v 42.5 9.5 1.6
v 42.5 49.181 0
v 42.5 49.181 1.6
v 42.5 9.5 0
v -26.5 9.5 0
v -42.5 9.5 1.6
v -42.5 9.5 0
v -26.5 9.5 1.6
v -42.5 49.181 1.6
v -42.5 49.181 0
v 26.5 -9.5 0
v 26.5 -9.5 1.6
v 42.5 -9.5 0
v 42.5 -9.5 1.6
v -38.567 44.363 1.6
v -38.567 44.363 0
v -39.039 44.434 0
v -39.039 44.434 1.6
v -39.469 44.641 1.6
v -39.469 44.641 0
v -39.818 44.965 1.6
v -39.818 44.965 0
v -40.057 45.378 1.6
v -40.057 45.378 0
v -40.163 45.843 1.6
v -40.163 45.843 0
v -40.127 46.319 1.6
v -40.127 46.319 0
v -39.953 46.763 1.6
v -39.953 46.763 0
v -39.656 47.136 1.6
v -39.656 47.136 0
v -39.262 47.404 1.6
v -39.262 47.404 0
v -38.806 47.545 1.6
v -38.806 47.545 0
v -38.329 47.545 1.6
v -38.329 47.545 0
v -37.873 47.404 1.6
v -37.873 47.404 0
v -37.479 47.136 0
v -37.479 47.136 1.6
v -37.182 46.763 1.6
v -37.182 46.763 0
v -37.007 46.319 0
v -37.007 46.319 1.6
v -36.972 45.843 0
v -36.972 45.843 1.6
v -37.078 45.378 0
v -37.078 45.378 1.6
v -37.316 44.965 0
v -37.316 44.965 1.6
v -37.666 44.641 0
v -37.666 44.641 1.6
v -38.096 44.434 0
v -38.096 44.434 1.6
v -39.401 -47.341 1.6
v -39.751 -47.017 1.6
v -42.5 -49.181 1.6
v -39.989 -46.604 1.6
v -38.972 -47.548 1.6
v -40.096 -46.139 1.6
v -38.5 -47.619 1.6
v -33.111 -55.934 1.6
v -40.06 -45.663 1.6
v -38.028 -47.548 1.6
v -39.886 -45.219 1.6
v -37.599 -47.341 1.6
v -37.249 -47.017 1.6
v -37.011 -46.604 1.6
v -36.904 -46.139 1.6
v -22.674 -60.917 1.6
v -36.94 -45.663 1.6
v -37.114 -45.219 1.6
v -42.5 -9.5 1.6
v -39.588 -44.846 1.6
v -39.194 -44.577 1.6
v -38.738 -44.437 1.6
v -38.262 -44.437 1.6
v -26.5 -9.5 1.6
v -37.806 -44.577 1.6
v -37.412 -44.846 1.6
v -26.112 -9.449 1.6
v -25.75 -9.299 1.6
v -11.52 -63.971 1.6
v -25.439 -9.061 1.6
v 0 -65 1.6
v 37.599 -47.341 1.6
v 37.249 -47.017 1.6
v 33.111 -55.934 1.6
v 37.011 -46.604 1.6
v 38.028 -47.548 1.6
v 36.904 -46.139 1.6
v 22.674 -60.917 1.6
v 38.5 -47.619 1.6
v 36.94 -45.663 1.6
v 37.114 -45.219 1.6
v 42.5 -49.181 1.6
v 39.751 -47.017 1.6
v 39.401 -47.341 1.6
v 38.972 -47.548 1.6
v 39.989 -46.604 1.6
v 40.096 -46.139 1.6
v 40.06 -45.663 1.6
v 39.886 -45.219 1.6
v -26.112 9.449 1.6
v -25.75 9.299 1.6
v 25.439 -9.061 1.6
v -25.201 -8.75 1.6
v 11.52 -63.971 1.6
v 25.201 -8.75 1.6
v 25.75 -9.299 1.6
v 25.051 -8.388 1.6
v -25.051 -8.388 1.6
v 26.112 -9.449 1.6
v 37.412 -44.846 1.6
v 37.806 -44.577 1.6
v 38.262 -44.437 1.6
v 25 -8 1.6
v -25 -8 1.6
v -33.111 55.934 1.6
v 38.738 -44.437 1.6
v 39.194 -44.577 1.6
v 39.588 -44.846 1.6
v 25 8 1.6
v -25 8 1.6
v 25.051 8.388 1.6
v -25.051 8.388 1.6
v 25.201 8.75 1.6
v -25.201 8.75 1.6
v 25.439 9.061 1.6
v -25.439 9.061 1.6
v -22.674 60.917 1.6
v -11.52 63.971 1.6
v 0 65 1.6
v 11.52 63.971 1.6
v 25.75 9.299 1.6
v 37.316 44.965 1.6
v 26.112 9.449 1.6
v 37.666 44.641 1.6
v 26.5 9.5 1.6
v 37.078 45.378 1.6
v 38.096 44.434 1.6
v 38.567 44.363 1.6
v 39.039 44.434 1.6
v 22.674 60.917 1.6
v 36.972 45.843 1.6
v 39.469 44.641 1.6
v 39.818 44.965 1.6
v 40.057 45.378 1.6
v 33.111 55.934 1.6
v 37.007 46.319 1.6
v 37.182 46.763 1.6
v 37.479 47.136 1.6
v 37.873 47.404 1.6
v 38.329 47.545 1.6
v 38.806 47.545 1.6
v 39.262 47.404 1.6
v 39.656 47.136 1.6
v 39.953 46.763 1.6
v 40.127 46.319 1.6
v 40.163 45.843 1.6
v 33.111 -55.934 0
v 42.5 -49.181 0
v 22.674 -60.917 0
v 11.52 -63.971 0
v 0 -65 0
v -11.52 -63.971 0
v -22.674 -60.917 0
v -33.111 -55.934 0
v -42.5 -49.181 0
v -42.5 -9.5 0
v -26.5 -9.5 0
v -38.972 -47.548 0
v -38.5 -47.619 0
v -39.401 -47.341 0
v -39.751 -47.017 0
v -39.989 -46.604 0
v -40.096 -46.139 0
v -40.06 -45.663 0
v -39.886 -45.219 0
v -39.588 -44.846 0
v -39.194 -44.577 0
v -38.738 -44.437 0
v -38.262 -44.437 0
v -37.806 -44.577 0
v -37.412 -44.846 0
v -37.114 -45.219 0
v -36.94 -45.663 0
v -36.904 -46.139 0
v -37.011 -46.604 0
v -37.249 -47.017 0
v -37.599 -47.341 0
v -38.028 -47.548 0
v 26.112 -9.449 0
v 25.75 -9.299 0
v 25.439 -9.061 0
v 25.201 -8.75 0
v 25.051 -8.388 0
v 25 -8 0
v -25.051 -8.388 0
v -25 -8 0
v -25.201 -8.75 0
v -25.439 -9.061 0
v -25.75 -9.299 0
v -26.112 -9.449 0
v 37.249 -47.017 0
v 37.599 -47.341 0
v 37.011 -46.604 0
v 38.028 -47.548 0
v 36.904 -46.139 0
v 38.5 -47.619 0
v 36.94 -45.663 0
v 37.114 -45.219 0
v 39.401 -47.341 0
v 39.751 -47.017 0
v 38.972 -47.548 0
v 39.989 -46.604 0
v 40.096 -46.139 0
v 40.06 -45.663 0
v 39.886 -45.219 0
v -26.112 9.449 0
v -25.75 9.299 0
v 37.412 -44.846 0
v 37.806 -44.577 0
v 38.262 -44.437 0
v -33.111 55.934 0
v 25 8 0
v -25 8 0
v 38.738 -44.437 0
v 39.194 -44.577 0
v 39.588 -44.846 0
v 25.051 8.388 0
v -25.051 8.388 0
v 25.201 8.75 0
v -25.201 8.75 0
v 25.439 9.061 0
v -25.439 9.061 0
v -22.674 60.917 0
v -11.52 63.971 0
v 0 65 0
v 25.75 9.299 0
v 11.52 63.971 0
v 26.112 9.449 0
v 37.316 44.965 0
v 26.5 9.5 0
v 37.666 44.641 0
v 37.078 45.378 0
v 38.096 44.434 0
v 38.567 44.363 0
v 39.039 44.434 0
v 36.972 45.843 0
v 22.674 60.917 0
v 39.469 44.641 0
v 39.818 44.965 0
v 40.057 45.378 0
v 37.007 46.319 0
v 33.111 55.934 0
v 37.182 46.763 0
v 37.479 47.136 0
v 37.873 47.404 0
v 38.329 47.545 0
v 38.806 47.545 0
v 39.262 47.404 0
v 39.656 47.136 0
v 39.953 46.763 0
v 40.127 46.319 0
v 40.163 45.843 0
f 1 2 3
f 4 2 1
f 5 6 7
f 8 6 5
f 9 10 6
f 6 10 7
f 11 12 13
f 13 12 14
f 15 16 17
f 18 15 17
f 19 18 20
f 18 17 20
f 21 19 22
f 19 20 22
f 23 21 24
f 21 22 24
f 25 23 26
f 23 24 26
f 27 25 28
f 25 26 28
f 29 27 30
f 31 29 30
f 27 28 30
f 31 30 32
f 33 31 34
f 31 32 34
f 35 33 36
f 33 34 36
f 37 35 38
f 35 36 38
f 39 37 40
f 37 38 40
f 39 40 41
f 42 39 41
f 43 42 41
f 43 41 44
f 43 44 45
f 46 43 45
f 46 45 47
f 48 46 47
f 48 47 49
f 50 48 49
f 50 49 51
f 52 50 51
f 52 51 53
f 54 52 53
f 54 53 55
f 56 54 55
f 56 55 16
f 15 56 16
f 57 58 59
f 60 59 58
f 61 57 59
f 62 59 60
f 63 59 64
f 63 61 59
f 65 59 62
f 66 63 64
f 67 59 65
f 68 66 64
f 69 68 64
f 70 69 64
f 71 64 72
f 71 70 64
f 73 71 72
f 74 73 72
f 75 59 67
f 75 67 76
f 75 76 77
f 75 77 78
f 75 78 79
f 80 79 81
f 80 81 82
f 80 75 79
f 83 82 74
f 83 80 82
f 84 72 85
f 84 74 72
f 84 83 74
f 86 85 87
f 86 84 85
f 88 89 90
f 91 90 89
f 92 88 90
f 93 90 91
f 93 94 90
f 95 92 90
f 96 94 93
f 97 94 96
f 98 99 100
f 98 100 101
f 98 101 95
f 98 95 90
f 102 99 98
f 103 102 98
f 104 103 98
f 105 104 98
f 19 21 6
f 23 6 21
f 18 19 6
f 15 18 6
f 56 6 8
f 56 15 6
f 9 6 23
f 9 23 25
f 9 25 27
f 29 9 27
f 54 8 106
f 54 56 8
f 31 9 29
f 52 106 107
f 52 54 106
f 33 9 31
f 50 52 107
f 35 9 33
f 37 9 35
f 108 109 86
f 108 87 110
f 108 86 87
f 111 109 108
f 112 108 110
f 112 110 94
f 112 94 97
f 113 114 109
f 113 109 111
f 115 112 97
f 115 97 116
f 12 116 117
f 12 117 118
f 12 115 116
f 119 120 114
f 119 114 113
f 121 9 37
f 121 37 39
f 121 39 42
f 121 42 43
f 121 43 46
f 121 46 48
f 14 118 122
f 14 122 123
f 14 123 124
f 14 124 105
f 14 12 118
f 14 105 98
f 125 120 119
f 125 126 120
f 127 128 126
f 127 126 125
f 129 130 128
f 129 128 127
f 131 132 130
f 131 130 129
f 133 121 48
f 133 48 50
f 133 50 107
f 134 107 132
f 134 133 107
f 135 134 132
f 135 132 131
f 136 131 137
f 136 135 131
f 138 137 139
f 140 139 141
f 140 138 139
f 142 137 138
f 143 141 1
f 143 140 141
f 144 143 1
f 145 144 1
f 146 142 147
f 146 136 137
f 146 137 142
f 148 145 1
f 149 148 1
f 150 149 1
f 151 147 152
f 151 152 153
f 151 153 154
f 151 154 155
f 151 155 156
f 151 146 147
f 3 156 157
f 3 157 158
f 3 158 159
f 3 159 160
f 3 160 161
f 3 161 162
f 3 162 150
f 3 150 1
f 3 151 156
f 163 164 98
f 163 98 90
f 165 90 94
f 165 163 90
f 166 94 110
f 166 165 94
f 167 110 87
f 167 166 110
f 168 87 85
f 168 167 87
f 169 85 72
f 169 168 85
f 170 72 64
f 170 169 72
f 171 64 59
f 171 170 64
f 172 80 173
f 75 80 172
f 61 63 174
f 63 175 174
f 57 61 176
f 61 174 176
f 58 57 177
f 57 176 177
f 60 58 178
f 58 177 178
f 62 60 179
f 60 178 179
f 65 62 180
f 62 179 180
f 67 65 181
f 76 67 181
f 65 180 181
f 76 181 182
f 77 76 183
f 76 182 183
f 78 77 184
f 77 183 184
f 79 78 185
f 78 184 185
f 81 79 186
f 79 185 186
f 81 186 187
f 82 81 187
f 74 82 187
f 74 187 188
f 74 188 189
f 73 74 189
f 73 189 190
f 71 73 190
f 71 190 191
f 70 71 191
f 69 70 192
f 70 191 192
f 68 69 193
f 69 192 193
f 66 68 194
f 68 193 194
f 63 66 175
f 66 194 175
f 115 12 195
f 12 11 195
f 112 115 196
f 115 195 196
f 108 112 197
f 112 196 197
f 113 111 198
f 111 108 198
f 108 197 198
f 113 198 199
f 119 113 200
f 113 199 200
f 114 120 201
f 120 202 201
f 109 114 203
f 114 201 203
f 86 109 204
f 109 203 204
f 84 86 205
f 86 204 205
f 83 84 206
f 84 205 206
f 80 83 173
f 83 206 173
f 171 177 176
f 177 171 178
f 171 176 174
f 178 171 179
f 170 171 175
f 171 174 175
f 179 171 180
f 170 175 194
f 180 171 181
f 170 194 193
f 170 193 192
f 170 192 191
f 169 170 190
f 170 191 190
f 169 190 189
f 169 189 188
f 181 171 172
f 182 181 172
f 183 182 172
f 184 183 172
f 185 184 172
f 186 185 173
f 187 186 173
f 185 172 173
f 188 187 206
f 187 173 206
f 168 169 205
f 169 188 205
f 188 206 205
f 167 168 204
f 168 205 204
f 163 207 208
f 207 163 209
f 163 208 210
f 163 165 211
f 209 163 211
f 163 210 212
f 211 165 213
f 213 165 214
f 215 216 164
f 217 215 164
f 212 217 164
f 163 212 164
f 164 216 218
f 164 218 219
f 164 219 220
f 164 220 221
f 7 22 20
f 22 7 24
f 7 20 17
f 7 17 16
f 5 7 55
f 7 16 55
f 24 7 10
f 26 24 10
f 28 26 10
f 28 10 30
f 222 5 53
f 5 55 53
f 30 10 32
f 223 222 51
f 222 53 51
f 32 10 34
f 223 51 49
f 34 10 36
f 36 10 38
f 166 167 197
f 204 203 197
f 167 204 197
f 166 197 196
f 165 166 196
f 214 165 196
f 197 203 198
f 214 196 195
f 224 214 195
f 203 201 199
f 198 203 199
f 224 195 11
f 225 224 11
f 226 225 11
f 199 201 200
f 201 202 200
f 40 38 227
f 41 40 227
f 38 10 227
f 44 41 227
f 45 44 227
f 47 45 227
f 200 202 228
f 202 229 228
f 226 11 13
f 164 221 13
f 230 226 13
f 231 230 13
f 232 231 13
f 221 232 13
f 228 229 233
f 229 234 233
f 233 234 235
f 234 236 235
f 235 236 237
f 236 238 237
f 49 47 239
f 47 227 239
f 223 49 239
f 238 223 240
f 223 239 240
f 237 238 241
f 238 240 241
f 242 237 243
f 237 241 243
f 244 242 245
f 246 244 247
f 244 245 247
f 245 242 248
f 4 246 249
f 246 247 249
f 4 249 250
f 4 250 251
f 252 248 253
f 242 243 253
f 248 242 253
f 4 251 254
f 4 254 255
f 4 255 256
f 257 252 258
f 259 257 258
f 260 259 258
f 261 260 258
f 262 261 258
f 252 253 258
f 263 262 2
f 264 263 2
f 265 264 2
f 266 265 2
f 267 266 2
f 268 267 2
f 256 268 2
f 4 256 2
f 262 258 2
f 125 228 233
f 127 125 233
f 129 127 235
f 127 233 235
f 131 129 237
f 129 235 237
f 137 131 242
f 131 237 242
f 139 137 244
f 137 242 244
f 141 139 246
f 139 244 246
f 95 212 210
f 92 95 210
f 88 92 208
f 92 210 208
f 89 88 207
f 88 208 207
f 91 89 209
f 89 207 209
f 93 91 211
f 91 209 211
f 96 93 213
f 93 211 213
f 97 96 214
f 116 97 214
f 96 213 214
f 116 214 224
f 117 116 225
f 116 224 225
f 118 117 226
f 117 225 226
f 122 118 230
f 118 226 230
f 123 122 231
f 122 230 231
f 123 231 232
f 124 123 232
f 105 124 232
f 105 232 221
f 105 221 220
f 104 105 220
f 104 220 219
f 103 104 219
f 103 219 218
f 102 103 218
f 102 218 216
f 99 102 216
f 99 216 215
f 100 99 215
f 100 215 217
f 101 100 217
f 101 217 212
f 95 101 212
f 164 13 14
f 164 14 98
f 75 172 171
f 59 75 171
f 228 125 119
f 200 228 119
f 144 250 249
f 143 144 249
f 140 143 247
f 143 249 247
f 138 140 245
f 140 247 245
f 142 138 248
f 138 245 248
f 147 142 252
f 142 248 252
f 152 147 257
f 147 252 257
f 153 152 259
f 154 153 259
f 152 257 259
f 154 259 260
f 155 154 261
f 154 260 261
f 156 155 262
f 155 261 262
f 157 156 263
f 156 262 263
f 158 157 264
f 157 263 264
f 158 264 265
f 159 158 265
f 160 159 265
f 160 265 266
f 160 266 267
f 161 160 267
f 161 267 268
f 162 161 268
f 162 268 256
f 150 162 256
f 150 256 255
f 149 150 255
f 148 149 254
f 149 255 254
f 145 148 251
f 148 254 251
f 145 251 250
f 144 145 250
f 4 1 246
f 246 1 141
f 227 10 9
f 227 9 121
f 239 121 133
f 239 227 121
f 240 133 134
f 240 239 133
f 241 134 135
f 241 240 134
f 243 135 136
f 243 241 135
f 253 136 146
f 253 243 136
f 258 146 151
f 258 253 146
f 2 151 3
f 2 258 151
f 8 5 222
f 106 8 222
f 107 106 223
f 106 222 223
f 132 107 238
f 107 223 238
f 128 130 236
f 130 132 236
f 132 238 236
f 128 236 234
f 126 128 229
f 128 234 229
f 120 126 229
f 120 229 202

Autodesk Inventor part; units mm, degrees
ref_plane "YZ Plane" through (0, 0, 0) normal (1, 0, 0) x (0, 1, 0)
ref_plane "XZ Plane" through (0, 0, 0) normal (0, 1, 0) x (-1, 0, 0)
ref_plane "XY Plane" through (0, 0, 0) normal (0, 0, 1) x (1, 0, 0)
sketch "スケッチ1" plane through (0, 0, 0) normal (0, 0, 1) x (1, 0, 0)
  circle A0 centre (0, 0) radius 65 construction
  line L0 (-42.5, 65) -> (42.5, 65) construction
  line L1 (42.5, 65) -> (42.5, -65) construction
  line L2 (42.5, -65) -> (-42.5, -65) construction
  line L3 (-42.5, -65) -> (-42.5, 65) construction
  arc A1 (42.5, 49.1808) -> (-42.5, 49.1808) centre (0, 0) ccw
  line L4 (-42.5, 49.1808) -> (-42.5, -49.1808)
  line L5 (42.5, 49.1808) -> (42.5, -49.1808)
  arc A2 (-42.5, -49.1808) -> (42.5, -49.1808) centre (0, 0) ccw
  point P0 (0, 65)
  dimension "d0" = 130
  dimension "d1" = 85
extrude "基板" add sketch "スケッチ1" along normal blind 1.6
sketch "スケッチ4" plane through (0, 0, 1.6) normal (0, 0, 1) x (1, 0, 0)
  line L0 (0, -55.1622) -> (0, 55.1622) construction
  line L1 (42.5, -49.1808) -> (42.5, 49.1808) construction
  circle A0 centre (0, 0) radius 60 construction
  line L2 (0, 0) -> (36.3616, 43.334) construction
  line L3 (0, 0) -> (56.5685, 0) construction
  point P0 (38.5, -46.019)
  point P1 (-38.5, -46.019)
  point P2 (38.5673, 45.9627)
  point P3 (-38.5673, 45.9627)
  dimension "d27" = 4
  dimension "d29" = 120
  dimension "d30" = 50
hole "スペーサ取付穴" at (38.5, -46.019, 1.6) at (-38.5, -46.019, 1.6) at (38.5673, 45.9627, 1.6) at (-38.5673, 45.9627, 1.6) direction (0, 0, -1) diameter 3.2 end through all
sketch "スケッチ6" plane through (0, 0, 1.6) normal (0, 0, 1) x (1, 0, 0)
  line L0 (-42.5, 49.1808) -> (-42.5, -49.1808) projected
  line L1 (-42.5, 9.5) -> (-25, 9.5)
  line L2 (-25, 9.5) -> (-25, -9.5)
  line L3 (-25, -9.5) -> (-42.5, -9.5)
  line L4 (-42.5, -9.5) -> (-42.5, 9.5)
  line L5 (42.5, 9.5) -> (25, 9.5)
  line L6 (25, 9.5) -> (25, -9.5)
  line L7 (25, -9.5) -> (42.5, -9.5)
  line L8 (42.5, -9.5) -> (42.5, 9.5)
  line L9 (42.5, -49.1808) -> (42.5, 49.1808) projected
  point P0 (0, 0)
  point P1 (-25, 0)
  dimension "d43" = 19
  dimension "d44" = 17.5
extrude "モータ用切欠き" cut sketch "スケッチ6" against normal through all
fillet "フィレット1" radius 1.5 4 edges at (-25, 9.5, 0.8) (-25, -9.5, 0.8) (25, 9.5, 0.8) (25, -9.5, 0.8)
properties part number "BaseBoard3"
